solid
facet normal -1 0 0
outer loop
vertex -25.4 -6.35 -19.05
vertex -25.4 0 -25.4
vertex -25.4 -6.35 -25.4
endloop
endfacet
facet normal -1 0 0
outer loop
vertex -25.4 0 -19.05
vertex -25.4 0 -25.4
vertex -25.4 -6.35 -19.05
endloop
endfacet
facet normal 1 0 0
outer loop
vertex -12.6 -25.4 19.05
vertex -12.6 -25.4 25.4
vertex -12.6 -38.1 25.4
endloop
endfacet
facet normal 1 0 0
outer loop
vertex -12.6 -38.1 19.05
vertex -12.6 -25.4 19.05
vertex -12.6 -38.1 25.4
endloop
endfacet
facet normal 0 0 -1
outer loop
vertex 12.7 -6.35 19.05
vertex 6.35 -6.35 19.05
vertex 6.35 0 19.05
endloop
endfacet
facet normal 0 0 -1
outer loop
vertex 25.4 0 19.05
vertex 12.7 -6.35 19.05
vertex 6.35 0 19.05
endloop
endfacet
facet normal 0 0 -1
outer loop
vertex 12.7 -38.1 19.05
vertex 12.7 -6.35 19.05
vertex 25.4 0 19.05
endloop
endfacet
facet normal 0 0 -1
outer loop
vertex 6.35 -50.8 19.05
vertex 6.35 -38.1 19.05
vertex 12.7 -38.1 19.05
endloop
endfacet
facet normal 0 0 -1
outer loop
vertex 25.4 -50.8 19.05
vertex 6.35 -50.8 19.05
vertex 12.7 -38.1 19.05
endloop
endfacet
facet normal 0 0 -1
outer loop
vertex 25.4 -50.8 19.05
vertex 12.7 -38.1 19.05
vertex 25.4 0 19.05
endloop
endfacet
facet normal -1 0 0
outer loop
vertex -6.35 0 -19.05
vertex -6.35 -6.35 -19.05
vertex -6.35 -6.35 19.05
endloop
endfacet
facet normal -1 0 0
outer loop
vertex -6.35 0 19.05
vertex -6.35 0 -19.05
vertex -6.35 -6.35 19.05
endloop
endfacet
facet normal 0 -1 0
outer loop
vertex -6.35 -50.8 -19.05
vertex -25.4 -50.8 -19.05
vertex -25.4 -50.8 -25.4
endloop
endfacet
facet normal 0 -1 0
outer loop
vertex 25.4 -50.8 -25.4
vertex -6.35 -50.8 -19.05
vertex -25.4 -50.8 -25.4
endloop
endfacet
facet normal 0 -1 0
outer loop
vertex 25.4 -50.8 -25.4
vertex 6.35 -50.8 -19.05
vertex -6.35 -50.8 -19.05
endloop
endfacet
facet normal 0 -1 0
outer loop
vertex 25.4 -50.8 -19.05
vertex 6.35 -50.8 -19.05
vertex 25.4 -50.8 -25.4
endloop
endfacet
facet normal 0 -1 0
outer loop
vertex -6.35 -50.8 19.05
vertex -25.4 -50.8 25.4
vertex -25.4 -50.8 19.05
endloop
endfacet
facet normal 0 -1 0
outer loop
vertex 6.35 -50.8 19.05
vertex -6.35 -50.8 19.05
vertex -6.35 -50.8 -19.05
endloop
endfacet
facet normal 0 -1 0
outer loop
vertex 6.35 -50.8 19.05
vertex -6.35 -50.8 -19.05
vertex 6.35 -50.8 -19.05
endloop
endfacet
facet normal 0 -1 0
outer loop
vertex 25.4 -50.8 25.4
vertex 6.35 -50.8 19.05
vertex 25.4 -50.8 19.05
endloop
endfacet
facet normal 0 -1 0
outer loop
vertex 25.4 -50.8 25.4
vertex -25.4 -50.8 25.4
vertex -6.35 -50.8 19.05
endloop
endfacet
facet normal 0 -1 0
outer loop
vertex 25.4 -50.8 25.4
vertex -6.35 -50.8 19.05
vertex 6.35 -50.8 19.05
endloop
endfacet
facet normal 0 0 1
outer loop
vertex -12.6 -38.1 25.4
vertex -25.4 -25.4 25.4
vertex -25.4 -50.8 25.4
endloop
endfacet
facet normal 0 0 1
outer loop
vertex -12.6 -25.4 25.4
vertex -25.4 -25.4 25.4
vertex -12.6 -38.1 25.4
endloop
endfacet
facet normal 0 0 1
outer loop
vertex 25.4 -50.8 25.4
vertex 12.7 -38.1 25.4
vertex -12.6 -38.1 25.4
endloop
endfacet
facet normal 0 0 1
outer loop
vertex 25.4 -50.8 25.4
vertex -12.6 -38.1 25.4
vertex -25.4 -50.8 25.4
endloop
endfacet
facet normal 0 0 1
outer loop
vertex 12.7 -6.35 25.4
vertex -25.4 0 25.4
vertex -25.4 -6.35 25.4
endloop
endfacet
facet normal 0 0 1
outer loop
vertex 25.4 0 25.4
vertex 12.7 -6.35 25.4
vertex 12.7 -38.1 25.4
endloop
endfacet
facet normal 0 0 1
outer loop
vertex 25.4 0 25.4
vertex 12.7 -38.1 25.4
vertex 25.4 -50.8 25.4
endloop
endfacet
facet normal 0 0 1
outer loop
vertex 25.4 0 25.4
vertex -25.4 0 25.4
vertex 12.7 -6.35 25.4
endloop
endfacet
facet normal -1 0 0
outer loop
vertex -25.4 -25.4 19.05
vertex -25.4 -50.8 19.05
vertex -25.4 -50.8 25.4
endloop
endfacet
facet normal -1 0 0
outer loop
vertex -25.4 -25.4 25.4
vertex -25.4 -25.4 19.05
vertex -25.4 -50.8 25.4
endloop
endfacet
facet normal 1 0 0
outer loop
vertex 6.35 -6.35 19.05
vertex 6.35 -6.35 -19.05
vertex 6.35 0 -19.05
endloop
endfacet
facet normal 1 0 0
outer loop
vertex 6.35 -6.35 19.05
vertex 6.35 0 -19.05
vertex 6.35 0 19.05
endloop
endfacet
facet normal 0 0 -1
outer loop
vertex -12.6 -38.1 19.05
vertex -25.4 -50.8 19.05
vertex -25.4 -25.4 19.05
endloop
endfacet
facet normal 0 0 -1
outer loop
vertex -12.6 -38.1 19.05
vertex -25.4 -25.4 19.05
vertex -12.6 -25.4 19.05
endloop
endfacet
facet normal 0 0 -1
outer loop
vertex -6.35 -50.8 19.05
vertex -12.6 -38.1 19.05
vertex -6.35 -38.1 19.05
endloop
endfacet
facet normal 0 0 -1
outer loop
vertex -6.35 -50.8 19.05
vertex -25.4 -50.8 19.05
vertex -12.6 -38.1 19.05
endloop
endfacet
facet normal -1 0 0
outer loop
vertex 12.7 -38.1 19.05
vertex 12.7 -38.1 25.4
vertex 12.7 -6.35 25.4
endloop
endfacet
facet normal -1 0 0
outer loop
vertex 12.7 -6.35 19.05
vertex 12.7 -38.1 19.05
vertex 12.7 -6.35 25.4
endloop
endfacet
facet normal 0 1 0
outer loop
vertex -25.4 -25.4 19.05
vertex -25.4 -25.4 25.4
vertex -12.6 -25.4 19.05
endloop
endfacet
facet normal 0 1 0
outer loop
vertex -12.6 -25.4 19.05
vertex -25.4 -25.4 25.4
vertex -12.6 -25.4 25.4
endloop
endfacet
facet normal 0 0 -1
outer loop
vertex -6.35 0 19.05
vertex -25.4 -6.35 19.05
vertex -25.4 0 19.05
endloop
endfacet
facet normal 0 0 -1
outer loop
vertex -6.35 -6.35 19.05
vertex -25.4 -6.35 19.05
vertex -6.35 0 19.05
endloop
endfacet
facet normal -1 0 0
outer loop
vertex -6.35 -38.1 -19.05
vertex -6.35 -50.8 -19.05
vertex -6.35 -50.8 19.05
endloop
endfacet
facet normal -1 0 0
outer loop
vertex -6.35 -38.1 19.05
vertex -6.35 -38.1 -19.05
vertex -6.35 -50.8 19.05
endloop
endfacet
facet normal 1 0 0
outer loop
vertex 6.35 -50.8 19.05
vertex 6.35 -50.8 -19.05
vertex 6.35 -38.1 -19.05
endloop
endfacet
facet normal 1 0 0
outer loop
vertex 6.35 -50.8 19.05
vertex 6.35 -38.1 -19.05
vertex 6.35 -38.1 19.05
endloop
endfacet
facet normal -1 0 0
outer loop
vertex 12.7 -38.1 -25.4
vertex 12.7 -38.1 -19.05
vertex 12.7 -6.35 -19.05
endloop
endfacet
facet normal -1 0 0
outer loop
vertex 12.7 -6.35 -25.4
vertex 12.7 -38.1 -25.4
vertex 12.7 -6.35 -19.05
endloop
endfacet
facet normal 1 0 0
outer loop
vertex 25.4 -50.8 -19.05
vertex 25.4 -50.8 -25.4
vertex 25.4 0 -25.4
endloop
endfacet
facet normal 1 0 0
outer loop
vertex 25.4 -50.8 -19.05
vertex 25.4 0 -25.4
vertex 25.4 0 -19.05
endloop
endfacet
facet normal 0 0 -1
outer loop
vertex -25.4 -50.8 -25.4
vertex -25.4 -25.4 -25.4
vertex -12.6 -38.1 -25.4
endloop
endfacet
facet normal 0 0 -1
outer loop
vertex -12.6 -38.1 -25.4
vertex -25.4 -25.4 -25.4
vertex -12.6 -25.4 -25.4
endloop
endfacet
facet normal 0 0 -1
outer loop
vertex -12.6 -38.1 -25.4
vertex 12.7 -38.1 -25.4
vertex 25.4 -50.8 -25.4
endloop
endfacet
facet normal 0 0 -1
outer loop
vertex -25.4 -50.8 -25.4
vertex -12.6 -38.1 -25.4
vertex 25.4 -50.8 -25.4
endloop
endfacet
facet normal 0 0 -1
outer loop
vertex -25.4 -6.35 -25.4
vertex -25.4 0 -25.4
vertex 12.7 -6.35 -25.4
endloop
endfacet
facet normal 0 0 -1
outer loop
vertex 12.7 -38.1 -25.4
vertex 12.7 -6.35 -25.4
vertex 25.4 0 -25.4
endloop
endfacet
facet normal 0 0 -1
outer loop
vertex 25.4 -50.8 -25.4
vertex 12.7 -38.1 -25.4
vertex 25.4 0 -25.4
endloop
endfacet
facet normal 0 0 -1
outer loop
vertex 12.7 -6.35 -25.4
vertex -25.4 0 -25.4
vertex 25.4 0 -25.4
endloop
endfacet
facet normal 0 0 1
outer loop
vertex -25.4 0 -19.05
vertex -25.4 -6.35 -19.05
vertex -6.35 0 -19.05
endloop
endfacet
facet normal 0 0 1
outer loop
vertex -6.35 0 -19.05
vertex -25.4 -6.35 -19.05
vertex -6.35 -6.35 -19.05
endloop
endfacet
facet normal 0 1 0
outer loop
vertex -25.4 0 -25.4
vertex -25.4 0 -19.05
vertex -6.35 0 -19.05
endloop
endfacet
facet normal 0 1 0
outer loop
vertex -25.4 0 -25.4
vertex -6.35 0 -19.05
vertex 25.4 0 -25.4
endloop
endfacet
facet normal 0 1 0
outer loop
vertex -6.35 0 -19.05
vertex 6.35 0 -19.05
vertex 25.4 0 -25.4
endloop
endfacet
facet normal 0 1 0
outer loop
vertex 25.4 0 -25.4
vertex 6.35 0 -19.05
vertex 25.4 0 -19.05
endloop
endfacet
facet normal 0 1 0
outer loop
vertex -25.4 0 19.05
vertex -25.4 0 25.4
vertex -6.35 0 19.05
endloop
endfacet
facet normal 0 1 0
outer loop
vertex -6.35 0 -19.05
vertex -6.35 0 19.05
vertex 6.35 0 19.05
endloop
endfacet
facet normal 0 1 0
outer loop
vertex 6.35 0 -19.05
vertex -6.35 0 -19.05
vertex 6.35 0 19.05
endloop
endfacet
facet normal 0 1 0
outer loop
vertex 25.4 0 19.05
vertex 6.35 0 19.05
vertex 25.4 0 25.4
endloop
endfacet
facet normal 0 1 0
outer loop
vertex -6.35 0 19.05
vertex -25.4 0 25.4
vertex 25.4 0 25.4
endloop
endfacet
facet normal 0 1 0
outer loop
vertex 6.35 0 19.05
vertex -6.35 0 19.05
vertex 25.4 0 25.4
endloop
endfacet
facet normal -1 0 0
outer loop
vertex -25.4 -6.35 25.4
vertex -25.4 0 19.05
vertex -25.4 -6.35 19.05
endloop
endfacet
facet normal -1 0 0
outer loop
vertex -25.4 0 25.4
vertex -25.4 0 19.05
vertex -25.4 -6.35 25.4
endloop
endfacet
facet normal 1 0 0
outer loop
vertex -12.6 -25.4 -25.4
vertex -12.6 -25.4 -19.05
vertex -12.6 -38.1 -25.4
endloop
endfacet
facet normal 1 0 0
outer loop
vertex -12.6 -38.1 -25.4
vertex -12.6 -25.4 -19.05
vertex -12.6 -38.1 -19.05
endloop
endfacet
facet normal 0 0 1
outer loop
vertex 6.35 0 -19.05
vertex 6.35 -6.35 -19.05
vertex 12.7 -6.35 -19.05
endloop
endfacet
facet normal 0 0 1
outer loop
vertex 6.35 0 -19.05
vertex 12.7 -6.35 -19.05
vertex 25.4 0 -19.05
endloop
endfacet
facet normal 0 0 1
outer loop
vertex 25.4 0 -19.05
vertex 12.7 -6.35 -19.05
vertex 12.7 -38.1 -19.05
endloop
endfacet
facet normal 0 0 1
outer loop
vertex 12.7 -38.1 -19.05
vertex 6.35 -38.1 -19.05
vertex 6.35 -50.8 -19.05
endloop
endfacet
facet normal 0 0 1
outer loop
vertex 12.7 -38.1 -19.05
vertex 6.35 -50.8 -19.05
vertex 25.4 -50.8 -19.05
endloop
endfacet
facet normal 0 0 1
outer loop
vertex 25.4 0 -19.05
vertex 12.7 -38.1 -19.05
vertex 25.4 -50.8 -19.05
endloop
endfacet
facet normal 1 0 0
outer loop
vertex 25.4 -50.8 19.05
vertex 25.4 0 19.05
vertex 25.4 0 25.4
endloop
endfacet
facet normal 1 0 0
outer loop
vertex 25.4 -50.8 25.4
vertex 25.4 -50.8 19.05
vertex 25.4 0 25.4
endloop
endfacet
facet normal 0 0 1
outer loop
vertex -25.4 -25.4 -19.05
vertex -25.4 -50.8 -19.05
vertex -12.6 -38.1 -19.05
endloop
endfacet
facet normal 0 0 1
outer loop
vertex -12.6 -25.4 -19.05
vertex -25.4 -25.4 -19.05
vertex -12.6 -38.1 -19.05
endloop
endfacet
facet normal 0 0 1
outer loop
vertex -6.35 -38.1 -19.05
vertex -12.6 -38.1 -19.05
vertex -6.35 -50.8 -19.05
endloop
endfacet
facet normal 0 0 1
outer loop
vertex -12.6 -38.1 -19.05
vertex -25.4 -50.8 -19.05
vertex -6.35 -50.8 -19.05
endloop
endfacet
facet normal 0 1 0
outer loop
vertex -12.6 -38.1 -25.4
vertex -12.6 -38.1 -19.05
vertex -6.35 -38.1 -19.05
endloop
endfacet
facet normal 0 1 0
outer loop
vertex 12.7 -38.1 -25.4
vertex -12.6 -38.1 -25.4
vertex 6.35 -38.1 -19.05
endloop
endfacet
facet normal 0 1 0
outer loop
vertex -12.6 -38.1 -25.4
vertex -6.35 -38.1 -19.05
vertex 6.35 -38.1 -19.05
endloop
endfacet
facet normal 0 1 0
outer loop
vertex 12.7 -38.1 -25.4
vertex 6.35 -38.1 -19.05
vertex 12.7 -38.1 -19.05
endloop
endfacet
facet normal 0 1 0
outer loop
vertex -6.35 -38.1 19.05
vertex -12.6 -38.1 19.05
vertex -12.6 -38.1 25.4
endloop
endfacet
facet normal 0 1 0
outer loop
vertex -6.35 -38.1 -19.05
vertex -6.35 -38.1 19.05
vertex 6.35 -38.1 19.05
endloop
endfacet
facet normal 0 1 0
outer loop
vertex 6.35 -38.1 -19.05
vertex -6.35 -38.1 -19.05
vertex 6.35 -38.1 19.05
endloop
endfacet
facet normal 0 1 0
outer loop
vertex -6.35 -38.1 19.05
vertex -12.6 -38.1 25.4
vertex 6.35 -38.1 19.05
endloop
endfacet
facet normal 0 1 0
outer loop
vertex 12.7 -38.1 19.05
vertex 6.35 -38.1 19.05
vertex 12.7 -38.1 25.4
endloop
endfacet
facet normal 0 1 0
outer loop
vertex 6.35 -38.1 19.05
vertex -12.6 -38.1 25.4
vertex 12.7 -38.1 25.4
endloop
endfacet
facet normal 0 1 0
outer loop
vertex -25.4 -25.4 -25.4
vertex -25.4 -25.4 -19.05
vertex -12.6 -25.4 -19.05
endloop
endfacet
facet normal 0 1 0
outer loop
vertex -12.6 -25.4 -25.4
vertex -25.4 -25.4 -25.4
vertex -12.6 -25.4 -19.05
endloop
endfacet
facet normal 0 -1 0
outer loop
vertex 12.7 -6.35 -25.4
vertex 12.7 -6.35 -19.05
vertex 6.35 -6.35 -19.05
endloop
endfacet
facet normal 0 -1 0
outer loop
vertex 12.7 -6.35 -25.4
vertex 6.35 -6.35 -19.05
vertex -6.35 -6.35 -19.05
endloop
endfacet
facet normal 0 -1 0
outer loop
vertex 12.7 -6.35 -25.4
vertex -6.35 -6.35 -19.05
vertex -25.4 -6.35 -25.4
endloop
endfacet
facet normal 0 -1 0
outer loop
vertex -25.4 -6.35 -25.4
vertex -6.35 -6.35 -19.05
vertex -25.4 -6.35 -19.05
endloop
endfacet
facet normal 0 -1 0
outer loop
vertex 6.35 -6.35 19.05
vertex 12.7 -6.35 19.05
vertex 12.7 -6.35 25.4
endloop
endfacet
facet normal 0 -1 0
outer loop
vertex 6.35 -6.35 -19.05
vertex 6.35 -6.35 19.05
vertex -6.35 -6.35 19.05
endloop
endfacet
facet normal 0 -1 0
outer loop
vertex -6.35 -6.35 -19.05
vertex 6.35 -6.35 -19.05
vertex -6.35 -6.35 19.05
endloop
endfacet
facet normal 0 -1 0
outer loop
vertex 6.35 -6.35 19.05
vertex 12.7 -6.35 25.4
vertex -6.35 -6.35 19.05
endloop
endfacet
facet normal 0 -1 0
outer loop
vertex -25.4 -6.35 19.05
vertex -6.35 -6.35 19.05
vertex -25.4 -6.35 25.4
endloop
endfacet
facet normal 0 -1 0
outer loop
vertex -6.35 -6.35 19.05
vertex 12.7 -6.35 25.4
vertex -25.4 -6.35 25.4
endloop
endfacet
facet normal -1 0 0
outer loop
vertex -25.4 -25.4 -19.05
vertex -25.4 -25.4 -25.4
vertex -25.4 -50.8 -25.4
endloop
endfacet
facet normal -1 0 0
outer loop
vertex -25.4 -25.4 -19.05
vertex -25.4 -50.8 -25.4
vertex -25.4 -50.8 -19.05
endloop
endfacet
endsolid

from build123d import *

# Parameters (mm, degrees)
F0_W     = 50.8
F0_H     = 50.8
F1_DEPTH = 50.8
F4_W     = 19.05
F4_H     = 38.1
F5_DEPTH = 50.8
F7_DEPTH = 76.2


with BuildPart() as f1:
    # F0 (on Front) → F1 (new body)
    with BuildSketch(Plane.XZ):
        Rectangle(F0_W, F0_H)
    extrude(amount=F1_DEPTH)

    # F4 (on offset) → F5 (cut)
    with BuildSketch(Plane.XZ.offset(50.8)):
        with Locations((-15.875, 0)):
            Rectangle(F4_W, F4_H)
        with Locations((15.875, 0)):
            Rectangle(F4_W, F4_H)
    extrude(amount=-F5_DEPTH, mode=Mode.SUBTRACT)

    # F6 (on offset) → F7 (cut)
    with BuildSketch(Plane.XY.offset(50.8)):
        Polygon((-25.4, -6.35), (-25.4, -25.4), (-12.5995083759, -25.4), (-12.5995083759, -38.1), (12.7, -38.1), (12.7, -6.35), align=None)
    extrude(amount=-F7_DEPTH, mode=Mode.SUBTRACT)


solid = f1.part
